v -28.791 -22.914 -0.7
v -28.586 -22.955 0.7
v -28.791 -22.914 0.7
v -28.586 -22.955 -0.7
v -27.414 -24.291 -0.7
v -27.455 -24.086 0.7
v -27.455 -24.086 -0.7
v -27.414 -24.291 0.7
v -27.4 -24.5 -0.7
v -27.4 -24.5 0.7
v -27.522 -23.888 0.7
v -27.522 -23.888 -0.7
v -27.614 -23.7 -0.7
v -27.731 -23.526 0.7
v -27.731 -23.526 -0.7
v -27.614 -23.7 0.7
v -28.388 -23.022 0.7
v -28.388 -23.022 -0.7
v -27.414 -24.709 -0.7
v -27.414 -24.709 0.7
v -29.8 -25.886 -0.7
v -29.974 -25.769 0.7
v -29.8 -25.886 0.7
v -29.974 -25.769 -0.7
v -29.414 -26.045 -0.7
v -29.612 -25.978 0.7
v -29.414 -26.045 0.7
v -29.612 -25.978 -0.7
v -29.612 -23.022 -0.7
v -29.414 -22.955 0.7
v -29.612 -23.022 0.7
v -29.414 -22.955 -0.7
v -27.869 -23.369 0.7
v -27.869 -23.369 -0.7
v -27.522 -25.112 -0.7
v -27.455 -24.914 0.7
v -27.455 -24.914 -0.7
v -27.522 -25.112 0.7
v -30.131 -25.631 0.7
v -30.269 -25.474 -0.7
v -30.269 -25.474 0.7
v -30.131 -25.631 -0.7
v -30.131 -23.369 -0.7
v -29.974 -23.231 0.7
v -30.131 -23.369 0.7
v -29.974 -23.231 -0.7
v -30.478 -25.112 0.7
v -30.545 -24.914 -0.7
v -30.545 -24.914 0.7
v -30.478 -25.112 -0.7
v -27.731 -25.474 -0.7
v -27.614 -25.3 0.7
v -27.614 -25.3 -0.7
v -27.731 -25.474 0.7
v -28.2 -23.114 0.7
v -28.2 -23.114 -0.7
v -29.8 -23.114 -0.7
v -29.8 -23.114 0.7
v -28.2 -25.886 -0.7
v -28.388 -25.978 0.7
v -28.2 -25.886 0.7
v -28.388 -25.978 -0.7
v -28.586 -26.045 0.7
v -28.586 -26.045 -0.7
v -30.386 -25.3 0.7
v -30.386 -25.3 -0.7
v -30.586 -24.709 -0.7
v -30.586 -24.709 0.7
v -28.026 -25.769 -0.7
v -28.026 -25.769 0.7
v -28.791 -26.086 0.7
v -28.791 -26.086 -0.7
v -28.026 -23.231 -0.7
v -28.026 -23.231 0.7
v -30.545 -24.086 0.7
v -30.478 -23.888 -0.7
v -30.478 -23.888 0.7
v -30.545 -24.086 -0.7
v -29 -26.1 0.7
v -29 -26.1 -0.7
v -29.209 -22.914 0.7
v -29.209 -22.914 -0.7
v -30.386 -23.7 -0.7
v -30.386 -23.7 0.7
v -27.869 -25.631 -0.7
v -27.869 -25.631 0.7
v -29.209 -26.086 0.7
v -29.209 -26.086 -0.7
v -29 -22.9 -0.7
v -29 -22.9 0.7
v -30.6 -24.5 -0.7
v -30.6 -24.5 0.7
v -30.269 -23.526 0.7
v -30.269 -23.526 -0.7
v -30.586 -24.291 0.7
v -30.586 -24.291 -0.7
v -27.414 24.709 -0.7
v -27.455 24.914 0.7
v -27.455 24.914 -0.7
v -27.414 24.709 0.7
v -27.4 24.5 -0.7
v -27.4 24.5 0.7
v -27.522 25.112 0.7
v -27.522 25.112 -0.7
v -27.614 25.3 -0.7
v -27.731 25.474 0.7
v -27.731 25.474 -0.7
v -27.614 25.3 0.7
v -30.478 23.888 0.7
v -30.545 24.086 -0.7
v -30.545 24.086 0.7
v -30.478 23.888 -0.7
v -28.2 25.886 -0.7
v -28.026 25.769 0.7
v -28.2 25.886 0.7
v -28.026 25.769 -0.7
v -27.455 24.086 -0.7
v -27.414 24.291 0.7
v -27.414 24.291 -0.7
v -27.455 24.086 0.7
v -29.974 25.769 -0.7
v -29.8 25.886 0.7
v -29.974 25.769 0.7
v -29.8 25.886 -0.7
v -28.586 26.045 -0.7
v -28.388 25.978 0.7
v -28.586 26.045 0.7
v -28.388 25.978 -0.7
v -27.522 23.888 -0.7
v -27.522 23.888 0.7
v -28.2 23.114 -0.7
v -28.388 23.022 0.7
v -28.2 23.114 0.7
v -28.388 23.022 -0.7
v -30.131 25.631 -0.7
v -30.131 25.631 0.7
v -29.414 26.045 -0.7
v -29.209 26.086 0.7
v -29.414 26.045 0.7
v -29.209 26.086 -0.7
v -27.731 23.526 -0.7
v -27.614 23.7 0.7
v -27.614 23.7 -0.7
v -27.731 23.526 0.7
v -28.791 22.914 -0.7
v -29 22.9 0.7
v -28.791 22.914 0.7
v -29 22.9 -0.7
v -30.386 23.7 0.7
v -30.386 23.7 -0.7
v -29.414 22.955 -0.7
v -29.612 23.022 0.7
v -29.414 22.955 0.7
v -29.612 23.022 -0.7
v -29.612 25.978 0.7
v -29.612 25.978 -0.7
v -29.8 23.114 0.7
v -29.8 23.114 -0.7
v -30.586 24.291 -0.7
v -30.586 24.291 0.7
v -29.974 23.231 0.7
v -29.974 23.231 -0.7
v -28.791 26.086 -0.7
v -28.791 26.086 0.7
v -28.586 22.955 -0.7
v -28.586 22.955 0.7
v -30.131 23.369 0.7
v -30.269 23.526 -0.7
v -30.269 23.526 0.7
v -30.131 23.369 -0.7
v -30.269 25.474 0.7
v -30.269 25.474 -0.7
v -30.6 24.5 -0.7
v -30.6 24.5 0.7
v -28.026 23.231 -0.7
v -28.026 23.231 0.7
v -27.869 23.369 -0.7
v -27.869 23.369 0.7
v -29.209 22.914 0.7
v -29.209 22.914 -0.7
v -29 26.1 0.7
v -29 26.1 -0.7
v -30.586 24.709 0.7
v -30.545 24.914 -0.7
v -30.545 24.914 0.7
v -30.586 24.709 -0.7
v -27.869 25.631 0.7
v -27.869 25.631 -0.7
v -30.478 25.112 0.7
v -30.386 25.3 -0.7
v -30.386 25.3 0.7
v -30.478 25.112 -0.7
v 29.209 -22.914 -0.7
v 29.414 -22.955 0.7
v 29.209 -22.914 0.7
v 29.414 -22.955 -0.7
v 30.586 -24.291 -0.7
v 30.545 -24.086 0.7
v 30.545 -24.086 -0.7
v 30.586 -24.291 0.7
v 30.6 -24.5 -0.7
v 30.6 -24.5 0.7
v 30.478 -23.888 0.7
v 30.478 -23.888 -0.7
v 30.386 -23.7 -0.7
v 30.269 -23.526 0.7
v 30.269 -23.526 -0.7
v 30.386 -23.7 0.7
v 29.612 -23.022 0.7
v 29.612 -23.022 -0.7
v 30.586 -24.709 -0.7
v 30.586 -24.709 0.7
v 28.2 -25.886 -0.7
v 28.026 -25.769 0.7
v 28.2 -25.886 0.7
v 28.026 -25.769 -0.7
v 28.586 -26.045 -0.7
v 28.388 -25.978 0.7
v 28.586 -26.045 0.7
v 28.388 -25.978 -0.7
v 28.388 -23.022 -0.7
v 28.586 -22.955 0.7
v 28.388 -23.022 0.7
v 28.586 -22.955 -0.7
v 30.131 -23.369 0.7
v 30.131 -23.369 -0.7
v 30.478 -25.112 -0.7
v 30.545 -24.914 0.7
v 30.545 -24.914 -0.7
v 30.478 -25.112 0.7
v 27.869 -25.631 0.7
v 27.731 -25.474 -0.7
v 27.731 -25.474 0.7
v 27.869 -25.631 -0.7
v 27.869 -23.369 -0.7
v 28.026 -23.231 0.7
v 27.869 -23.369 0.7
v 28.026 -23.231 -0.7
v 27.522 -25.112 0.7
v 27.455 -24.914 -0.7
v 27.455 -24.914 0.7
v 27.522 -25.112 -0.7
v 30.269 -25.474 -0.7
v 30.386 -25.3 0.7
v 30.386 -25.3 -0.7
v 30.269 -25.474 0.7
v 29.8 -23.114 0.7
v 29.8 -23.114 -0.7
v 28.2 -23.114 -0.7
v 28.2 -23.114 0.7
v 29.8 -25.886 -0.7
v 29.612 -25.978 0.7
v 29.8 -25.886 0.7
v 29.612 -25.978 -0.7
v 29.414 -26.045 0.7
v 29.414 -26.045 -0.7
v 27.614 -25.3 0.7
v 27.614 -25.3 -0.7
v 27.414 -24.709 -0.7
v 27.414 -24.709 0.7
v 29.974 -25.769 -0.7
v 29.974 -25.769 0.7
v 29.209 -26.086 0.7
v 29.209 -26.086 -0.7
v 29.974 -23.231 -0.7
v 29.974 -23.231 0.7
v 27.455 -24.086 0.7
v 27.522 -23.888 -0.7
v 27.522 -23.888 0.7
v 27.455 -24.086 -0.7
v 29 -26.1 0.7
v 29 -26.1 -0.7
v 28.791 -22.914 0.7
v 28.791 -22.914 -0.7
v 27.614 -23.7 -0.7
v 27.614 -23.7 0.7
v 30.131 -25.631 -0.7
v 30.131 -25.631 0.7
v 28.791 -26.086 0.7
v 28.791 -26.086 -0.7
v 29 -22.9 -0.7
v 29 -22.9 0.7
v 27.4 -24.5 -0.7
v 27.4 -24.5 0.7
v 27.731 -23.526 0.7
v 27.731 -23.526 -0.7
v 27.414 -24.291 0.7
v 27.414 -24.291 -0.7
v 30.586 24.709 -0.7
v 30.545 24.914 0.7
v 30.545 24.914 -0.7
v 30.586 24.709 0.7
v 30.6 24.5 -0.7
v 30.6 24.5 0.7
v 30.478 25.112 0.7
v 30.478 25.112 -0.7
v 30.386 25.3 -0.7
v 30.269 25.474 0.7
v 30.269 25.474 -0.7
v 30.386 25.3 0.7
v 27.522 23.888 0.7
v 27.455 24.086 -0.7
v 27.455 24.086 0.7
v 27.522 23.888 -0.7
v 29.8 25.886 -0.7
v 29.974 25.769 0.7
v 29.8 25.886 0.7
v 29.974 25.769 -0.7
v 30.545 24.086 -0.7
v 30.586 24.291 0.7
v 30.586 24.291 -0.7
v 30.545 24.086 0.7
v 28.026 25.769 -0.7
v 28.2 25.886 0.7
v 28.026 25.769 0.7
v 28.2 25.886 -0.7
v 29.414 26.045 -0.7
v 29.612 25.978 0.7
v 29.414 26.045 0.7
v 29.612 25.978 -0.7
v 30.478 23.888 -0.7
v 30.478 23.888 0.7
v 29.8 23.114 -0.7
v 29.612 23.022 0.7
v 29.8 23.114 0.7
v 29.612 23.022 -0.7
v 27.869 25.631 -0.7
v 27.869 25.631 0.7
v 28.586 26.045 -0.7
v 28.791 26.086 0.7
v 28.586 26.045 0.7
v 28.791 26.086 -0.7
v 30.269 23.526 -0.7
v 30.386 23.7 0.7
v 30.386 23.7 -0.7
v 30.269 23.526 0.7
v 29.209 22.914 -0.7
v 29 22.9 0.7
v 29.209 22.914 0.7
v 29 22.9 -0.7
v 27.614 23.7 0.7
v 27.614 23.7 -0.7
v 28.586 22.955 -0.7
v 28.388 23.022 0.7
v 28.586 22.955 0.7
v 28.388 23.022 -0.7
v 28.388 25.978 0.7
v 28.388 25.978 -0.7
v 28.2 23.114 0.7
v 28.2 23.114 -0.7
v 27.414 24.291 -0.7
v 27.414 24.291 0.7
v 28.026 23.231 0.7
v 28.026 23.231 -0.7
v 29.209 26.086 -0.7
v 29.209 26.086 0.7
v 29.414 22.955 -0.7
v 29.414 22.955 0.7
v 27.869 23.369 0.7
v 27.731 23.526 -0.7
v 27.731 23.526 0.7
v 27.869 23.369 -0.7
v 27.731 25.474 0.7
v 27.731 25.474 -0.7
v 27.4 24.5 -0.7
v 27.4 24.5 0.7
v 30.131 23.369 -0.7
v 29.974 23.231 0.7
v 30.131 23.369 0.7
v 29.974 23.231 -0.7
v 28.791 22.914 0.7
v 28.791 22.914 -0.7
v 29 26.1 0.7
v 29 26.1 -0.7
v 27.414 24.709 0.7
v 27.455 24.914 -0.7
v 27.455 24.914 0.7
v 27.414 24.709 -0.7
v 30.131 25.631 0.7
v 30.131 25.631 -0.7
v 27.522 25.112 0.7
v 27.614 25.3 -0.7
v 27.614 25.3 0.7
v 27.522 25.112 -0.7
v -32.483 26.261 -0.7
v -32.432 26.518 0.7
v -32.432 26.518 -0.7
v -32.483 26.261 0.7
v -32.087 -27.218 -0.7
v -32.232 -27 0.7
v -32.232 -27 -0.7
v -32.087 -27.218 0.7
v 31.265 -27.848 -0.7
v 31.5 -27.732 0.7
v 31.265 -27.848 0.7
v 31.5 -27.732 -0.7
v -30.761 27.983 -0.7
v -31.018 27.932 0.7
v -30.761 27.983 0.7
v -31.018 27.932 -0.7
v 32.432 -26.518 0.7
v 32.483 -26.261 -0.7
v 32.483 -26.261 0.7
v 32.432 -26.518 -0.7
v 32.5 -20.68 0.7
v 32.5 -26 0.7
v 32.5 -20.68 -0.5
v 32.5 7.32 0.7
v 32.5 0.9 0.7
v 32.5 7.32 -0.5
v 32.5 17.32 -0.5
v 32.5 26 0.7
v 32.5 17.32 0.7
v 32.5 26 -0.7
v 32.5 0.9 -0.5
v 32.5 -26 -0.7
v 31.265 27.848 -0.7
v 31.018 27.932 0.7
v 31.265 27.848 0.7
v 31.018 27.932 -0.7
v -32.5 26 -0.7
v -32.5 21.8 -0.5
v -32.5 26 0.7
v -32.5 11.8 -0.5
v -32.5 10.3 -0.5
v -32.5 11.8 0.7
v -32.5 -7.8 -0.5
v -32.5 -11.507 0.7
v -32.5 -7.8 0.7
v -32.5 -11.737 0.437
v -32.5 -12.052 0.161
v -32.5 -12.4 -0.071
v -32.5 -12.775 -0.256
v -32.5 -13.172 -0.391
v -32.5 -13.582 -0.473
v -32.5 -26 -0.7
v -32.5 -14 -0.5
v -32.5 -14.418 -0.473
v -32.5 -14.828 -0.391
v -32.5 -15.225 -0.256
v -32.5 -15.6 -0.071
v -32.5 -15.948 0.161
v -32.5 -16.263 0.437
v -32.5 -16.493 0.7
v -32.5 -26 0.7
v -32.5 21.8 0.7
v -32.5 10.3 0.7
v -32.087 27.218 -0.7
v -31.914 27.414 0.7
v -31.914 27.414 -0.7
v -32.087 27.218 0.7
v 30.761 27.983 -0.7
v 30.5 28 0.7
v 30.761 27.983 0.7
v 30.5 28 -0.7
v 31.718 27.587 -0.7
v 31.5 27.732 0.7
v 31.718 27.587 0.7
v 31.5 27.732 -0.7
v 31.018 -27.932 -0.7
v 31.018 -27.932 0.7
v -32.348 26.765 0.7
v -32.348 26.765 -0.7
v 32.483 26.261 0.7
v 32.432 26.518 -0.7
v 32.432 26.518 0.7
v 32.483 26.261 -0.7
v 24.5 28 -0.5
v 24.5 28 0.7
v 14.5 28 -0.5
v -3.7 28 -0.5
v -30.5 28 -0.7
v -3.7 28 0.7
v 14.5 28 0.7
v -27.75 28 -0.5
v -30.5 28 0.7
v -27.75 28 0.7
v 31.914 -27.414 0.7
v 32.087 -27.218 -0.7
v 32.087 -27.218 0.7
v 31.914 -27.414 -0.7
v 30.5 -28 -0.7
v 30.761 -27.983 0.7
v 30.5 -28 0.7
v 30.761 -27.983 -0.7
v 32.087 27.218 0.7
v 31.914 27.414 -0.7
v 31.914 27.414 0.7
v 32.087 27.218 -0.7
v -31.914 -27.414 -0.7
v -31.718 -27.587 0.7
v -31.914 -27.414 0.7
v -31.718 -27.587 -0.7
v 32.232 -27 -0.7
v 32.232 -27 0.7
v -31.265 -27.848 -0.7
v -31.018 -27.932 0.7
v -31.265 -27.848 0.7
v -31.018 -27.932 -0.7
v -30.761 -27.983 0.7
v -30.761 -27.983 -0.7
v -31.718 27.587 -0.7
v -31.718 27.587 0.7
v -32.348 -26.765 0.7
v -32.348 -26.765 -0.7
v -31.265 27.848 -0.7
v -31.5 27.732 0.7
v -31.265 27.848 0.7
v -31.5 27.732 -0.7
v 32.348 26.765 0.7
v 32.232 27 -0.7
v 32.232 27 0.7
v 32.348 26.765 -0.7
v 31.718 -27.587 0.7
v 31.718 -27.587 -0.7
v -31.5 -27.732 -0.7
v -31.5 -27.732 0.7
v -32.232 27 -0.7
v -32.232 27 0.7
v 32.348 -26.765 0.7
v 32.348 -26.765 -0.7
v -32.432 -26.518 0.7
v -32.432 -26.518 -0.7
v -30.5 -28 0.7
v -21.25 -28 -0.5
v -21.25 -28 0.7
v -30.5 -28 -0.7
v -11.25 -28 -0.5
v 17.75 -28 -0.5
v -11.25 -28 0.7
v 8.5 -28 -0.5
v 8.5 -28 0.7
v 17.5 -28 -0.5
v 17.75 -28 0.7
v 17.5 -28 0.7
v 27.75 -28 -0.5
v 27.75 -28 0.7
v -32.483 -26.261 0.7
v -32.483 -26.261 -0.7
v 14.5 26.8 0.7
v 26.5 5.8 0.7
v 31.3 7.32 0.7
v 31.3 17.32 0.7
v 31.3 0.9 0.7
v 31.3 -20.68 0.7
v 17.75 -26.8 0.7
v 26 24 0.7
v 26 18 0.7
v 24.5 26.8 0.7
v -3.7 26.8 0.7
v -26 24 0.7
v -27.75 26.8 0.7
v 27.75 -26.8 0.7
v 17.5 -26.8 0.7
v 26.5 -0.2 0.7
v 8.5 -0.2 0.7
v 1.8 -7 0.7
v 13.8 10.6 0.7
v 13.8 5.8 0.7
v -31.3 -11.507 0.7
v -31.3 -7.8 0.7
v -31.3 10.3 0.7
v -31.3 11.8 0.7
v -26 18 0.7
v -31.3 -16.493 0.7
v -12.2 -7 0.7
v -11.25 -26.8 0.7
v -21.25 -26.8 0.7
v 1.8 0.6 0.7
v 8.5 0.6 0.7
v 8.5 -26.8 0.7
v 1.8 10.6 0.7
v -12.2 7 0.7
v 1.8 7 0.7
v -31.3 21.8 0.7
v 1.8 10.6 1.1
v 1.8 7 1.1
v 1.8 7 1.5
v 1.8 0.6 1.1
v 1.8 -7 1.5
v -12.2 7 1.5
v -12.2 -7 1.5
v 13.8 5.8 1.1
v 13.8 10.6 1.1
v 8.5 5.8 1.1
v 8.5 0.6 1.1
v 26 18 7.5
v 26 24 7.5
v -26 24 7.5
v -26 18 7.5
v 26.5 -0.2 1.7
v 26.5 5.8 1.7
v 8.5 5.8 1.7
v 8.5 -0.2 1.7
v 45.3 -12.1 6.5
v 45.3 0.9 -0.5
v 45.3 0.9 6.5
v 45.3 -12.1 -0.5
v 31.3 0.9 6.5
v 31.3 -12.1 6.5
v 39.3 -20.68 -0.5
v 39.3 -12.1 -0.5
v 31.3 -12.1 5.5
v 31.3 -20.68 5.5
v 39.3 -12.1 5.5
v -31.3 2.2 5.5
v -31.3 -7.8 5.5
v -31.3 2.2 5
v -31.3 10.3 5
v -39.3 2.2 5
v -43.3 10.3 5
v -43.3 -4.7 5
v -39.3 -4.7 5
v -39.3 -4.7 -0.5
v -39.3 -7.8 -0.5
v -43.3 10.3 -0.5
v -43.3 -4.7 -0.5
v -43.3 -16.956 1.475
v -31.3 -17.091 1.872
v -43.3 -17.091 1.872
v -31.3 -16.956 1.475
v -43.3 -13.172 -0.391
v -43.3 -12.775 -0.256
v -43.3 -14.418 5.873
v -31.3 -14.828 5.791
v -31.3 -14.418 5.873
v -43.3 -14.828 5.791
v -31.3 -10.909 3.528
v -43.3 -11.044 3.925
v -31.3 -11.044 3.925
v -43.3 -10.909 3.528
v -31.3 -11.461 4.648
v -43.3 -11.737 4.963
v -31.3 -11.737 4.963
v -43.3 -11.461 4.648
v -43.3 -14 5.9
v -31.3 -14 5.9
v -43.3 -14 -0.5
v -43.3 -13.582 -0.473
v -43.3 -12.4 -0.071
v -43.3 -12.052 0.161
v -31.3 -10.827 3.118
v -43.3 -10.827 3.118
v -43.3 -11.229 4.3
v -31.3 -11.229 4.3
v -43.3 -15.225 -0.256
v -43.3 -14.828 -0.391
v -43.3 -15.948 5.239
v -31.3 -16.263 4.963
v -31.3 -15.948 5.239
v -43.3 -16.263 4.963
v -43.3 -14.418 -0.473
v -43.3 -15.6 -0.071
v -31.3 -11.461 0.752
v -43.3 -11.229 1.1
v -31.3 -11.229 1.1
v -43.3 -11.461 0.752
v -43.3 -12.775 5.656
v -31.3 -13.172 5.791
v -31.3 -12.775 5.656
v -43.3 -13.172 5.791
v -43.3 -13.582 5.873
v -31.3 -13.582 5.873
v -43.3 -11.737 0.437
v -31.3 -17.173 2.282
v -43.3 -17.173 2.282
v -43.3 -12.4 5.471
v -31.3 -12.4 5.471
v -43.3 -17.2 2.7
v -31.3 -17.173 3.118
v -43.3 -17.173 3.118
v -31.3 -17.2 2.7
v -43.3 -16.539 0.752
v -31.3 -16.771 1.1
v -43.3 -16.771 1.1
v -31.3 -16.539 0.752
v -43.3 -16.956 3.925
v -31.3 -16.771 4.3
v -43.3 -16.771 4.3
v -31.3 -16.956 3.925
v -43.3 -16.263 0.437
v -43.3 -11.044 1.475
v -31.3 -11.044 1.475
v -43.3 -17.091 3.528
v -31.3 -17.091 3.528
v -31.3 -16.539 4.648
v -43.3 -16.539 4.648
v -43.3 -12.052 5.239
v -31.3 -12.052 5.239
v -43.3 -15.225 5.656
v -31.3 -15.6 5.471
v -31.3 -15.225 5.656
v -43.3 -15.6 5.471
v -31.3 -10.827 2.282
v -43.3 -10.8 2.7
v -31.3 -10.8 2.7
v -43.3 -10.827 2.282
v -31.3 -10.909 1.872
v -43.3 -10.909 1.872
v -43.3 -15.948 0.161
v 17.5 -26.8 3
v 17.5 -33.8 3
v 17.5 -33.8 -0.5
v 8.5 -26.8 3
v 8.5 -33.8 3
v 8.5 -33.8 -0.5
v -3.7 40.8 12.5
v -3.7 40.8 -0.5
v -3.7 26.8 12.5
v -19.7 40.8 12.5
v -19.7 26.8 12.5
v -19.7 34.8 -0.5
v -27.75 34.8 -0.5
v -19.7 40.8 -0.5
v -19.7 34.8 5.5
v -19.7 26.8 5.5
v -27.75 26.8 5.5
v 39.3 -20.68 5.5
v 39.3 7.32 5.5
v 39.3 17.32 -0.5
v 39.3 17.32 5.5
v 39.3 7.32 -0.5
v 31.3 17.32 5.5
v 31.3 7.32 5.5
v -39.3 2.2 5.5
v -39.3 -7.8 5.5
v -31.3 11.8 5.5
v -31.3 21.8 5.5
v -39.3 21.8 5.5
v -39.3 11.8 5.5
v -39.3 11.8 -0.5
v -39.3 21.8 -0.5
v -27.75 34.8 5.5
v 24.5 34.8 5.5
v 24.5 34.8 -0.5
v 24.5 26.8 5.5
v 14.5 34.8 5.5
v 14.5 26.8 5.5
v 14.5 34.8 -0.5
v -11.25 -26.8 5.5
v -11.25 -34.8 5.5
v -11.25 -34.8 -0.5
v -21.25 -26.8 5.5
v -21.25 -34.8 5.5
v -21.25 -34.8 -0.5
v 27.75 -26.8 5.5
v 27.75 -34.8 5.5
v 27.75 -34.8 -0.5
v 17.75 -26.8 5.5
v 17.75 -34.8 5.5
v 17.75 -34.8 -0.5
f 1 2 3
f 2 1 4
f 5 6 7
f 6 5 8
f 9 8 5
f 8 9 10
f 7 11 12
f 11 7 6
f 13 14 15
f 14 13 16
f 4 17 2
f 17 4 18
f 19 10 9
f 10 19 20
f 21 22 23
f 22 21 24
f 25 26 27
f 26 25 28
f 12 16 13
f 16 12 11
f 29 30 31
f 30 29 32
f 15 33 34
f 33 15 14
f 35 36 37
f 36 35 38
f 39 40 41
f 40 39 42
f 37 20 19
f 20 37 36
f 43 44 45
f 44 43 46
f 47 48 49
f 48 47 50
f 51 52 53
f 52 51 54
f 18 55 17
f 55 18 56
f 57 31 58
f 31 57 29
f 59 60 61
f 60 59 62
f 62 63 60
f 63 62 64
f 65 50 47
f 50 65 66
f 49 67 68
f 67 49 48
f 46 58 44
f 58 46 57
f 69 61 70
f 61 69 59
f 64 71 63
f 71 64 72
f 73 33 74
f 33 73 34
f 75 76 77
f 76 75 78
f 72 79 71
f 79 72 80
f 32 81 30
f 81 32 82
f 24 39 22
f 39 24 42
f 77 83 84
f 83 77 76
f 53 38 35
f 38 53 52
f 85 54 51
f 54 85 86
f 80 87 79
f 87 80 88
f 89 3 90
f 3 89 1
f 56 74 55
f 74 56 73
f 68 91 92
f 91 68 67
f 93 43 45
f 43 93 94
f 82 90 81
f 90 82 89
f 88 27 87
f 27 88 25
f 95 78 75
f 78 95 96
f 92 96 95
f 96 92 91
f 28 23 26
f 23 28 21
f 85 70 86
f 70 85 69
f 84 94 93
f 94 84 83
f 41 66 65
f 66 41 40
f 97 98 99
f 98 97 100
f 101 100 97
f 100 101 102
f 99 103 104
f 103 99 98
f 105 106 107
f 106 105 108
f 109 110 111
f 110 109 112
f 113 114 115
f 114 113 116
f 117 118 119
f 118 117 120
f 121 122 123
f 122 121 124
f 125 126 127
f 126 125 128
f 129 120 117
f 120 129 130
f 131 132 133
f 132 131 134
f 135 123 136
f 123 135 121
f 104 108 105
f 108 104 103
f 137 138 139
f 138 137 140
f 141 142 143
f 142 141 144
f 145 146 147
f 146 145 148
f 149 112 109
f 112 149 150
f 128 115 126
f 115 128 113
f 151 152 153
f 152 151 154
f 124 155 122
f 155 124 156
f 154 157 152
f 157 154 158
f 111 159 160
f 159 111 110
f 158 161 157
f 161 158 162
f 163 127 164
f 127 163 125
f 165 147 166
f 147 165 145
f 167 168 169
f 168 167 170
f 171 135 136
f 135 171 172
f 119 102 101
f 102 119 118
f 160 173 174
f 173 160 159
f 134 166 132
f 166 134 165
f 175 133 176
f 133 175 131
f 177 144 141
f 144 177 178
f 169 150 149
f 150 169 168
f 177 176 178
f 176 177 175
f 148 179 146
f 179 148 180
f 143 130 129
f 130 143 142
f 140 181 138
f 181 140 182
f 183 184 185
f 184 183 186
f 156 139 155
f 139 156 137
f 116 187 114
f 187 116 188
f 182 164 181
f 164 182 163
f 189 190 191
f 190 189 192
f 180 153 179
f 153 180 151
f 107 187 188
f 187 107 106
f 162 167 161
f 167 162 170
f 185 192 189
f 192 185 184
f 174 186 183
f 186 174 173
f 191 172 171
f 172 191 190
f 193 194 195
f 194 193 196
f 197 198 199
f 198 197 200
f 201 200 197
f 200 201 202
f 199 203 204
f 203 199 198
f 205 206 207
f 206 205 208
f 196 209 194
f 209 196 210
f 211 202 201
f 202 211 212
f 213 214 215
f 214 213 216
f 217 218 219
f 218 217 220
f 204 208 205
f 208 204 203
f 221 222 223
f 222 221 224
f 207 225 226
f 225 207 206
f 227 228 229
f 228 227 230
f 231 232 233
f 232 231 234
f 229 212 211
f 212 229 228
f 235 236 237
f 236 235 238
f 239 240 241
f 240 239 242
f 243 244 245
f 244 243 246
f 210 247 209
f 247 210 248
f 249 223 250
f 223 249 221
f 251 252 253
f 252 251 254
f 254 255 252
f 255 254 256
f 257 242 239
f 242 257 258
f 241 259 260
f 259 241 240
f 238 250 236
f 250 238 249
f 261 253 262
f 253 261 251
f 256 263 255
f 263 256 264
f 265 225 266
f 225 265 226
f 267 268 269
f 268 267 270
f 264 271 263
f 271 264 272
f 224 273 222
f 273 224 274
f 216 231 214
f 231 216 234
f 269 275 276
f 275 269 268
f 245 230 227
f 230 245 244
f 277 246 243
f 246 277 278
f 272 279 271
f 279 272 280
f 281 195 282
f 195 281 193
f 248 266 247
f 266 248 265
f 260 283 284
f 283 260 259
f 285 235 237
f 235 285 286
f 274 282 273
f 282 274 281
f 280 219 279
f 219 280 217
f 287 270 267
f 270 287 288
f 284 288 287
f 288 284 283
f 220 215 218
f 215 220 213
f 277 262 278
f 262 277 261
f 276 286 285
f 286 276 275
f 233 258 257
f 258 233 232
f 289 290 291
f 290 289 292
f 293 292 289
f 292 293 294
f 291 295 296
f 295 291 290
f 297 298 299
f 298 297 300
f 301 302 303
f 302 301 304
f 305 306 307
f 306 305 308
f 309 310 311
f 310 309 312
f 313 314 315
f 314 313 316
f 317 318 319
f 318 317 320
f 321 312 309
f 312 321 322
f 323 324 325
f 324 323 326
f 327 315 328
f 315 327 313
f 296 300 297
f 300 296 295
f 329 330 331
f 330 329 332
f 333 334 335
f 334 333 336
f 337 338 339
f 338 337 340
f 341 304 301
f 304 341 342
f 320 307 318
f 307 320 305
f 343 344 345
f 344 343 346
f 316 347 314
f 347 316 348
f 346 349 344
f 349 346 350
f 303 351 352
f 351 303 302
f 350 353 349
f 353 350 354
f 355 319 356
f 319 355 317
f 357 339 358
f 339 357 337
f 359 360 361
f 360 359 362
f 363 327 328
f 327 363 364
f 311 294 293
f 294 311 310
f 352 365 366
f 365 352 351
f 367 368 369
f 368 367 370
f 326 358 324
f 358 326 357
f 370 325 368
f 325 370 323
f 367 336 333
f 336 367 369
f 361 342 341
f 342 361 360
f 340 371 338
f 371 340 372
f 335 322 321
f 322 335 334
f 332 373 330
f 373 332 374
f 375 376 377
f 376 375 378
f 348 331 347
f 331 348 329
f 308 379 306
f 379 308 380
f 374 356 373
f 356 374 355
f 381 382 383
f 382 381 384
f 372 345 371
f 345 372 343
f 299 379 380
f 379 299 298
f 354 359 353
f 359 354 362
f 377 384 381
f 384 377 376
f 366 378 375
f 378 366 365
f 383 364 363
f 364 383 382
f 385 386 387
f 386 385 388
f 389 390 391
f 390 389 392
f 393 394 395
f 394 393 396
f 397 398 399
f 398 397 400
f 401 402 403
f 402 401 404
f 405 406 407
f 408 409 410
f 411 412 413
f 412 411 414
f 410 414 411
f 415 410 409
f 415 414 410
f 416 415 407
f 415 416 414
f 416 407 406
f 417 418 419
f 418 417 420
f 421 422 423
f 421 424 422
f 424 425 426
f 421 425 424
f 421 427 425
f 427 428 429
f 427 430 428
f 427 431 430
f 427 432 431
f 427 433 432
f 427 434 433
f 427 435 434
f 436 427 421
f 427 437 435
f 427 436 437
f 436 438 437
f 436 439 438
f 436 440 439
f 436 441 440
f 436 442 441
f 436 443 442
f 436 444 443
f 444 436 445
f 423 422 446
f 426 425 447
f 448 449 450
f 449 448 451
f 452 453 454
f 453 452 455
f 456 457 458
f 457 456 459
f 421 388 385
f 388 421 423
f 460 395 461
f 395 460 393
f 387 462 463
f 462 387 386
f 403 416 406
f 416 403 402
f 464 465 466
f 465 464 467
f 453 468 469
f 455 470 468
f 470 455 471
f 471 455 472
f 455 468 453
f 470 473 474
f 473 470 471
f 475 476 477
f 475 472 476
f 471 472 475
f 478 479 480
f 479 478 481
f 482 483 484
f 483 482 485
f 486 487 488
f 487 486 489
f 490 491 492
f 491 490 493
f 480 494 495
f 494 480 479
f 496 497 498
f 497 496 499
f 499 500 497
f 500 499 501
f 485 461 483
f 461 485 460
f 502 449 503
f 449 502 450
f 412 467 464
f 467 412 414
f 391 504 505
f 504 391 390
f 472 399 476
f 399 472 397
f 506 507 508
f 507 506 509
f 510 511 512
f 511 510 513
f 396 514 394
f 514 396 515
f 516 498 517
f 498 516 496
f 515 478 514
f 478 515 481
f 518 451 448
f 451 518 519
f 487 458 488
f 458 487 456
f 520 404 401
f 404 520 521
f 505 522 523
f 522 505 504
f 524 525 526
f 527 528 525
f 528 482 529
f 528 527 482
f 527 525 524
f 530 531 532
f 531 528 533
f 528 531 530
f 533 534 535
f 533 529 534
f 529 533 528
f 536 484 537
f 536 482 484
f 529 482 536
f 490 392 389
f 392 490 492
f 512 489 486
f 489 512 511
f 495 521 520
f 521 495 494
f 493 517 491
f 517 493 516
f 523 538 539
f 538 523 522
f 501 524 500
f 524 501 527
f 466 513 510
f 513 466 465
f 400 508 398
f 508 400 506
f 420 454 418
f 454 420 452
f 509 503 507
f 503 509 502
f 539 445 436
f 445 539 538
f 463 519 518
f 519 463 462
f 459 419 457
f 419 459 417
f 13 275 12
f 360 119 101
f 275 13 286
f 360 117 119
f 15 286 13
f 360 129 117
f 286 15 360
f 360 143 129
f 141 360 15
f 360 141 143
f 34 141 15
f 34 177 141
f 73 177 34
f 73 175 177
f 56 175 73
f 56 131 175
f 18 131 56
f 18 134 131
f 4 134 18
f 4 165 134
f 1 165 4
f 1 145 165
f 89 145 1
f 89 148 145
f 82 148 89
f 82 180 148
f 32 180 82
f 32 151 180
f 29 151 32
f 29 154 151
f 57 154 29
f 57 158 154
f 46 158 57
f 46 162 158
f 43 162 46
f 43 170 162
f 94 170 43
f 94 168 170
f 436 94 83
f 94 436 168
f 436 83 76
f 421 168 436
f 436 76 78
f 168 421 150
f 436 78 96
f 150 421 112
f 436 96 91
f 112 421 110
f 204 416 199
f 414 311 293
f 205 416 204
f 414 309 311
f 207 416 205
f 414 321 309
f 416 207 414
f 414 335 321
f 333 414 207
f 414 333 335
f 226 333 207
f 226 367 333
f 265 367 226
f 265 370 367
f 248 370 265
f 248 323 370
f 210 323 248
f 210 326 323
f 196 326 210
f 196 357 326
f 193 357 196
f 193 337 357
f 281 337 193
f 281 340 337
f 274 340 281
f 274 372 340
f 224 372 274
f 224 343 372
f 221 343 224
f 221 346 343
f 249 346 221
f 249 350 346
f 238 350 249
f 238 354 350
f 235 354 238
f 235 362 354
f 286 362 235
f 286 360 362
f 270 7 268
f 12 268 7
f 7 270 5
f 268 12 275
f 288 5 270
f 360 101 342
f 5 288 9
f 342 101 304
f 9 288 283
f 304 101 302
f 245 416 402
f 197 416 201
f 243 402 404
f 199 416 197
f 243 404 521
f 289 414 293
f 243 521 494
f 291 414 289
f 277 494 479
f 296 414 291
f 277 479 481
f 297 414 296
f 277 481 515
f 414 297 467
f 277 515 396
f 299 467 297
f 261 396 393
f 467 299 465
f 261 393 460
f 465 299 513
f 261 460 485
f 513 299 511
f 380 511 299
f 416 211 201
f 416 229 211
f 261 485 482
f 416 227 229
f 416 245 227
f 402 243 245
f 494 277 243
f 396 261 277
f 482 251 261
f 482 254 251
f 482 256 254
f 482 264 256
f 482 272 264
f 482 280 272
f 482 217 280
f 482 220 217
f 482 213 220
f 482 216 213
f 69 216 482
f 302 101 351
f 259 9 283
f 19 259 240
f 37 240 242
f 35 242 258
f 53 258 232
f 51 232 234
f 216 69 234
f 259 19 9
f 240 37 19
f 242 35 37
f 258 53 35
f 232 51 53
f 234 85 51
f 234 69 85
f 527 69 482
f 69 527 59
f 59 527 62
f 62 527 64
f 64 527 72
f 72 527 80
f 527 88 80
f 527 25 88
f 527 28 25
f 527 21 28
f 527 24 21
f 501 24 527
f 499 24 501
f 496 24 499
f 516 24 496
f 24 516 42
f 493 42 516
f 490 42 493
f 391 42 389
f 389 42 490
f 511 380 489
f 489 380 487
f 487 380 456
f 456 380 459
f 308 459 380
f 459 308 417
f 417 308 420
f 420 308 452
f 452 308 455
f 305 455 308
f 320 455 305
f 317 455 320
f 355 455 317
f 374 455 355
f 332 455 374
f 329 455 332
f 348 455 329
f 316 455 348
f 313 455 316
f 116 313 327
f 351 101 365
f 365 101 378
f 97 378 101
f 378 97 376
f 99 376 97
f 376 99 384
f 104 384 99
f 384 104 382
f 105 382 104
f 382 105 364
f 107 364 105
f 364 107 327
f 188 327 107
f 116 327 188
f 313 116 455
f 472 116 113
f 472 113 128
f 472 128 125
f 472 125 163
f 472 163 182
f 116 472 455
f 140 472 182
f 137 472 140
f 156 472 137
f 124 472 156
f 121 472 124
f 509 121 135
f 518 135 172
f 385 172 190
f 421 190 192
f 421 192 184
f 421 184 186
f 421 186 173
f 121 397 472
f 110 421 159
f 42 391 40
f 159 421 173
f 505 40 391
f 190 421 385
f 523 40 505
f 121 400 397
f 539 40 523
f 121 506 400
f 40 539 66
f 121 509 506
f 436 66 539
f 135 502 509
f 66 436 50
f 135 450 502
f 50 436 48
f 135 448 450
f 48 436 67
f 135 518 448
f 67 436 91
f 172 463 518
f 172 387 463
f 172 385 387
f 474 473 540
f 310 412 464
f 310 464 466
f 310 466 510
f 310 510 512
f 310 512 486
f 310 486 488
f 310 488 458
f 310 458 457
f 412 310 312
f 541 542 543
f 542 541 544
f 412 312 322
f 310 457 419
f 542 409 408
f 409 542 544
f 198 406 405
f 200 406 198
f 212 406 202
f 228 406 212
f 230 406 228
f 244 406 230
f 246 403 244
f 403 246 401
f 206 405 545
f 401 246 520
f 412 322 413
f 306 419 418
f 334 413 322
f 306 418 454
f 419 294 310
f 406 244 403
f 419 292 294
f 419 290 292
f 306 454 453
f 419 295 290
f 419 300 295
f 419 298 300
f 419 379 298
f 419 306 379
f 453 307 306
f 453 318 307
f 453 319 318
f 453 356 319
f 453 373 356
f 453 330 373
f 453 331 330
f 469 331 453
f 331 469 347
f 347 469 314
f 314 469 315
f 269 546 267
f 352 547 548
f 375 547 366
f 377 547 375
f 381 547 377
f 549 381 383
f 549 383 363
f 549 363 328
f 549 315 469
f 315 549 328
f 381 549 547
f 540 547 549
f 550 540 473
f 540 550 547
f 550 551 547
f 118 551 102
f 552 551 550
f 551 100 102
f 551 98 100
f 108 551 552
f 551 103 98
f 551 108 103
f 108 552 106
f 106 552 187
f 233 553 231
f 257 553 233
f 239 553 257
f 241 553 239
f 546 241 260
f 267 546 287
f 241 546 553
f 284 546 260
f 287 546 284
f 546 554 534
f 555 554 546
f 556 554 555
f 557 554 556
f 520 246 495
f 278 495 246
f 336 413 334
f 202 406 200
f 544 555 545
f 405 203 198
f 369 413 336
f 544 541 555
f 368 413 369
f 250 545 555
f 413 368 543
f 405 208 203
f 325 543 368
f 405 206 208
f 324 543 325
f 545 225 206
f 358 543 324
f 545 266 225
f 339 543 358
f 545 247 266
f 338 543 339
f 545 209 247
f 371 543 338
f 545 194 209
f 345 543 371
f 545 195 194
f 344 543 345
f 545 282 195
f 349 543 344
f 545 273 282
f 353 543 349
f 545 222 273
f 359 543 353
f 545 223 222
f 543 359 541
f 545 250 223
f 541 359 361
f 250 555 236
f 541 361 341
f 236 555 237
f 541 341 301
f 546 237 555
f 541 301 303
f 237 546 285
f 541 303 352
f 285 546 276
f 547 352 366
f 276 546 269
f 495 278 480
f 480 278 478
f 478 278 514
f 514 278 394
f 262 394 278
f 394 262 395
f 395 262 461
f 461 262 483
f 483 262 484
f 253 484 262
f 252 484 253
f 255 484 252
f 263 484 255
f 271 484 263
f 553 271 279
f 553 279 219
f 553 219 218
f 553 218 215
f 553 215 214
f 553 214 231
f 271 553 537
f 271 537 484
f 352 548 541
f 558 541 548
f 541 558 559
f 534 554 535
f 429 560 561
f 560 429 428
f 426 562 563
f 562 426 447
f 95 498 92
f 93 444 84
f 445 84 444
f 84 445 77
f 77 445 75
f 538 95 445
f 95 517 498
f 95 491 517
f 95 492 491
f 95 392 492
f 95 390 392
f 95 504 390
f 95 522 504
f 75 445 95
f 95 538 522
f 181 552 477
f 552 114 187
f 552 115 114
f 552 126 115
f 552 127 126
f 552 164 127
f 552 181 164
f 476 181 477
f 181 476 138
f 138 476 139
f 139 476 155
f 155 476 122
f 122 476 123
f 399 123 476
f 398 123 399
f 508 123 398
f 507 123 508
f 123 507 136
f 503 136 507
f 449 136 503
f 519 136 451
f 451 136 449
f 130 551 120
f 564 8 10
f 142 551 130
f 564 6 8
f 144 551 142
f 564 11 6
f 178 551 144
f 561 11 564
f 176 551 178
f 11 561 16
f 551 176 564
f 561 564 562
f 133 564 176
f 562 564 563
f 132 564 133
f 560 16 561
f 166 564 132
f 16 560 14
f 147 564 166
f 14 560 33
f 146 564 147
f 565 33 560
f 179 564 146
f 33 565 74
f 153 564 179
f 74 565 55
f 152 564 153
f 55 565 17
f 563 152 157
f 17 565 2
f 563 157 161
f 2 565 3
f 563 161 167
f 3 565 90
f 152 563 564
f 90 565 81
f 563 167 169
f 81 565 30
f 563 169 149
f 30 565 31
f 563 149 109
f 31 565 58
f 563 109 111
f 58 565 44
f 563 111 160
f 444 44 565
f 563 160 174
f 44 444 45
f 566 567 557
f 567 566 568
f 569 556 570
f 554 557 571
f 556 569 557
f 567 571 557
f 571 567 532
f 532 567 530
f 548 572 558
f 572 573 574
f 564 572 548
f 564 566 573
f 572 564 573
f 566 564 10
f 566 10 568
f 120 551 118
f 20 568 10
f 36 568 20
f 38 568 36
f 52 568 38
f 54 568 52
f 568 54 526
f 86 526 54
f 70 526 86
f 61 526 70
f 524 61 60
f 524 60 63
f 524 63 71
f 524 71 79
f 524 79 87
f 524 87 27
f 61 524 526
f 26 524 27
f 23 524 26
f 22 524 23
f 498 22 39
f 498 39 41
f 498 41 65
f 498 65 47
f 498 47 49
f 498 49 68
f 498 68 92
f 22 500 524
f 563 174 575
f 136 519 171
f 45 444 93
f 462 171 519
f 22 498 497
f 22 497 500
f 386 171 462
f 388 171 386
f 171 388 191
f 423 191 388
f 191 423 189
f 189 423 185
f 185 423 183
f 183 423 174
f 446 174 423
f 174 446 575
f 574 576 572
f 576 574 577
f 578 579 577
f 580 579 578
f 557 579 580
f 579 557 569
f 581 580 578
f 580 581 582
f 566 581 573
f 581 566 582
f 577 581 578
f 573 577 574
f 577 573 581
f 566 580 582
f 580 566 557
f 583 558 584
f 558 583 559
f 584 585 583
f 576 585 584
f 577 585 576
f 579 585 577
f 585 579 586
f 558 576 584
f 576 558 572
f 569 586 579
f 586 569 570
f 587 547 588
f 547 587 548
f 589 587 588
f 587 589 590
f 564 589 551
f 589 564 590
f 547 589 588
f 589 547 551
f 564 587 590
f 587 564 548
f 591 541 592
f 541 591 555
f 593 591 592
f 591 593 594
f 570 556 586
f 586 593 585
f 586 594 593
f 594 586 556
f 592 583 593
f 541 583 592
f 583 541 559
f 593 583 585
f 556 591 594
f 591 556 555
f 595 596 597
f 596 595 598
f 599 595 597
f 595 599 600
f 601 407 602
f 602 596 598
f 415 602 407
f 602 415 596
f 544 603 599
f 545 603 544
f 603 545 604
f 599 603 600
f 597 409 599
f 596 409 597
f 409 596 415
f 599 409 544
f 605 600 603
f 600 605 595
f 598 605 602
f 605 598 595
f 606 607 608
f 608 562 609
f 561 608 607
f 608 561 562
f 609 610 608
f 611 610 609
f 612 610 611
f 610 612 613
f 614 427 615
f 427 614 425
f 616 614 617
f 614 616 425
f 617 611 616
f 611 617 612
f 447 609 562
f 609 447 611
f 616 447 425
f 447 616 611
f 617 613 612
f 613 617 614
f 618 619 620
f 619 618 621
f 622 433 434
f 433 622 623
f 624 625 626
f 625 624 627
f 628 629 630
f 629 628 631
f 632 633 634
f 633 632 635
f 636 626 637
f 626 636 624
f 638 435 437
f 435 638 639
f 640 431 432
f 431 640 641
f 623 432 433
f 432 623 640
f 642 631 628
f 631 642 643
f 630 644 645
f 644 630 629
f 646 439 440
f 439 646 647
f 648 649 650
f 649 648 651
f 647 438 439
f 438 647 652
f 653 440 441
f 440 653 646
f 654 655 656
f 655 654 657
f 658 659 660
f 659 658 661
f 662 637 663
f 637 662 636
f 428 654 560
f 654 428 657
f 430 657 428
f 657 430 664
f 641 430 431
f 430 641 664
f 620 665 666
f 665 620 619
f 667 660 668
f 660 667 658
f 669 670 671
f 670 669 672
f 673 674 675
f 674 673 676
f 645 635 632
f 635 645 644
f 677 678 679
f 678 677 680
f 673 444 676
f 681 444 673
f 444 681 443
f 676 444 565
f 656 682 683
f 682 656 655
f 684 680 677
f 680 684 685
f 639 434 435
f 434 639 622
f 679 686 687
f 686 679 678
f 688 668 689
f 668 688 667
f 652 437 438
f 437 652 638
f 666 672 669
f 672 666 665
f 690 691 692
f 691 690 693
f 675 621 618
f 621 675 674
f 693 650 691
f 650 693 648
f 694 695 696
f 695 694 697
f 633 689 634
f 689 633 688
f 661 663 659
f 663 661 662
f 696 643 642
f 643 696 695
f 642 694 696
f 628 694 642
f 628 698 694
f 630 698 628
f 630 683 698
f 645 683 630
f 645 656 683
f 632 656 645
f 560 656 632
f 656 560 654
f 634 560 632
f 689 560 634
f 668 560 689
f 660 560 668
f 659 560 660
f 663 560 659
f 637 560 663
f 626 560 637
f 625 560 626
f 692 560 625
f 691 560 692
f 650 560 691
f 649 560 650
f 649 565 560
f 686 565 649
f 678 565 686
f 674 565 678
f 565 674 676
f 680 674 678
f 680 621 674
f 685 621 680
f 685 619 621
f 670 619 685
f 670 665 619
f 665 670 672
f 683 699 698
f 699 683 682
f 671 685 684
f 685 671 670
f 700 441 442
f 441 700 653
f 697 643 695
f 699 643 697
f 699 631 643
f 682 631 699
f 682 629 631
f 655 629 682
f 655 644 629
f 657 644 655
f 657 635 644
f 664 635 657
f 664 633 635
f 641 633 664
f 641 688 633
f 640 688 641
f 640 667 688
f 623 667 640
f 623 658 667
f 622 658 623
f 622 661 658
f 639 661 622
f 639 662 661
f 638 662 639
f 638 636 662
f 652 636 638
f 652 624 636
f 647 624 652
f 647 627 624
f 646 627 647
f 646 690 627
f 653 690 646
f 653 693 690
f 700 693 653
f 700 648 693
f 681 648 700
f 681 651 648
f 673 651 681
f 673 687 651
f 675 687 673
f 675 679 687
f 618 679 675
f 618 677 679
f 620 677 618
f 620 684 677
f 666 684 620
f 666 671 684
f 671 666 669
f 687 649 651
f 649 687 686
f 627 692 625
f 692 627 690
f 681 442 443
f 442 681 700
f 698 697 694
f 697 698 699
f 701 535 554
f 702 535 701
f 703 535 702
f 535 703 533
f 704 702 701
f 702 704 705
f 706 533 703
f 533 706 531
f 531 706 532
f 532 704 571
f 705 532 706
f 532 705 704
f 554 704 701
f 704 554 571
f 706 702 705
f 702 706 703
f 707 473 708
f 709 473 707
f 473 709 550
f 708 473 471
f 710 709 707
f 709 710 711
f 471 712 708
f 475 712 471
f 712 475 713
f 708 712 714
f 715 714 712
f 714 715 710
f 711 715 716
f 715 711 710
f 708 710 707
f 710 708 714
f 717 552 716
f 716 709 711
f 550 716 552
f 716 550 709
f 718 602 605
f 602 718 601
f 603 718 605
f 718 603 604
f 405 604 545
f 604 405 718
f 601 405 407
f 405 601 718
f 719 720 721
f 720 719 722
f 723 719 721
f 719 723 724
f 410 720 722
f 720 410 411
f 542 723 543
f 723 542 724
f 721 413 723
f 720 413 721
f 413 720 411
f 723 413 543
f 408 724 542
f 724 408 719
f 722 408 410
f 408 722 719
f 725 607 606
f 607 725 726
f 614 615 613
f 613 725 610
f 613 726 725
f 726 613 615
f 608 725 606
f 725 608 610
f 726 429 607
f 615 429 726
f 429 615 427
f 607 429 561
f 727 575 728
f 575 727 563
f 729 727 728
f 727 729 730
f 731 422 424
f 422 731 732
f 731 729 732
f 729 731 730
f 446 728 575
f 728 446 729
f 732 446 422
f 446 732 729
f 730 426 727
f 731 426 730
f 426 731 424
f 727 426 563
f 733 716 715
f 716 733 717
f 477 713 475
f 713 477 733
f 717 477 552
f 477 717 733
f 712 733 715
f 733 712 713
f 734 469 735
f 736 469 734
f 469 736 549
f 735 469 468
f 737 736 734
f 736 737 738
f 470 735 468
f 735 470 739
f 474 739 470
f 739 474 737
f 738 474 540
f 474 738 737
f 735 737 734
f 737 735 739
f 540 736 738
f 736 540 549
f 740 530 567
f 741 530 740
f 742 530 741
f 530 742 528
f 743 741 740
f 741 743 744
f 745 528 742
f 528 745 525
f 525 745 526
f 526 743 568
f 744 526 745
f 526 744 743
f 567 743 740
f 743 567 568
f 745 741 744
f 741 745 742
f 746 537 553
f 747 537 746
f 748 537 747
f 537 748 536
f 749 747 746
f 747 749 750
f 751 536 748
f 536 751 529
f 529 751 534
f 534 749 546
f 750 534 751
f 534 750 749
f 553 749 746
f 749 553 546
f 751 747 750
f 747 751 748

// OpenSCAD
// Single-board computer (generic) 65.0mm x 56.0mm x 1.4mm PCB with connected features
// Output is ONE connected solid (no floating parts).

$fn = 48;

// Parameters
length_mm    = 65.0;  //[32.5:130.0:0.5]
width_mm     = 56.0;  //[28.0:112.0:0.5]
thickness_mm = 1.4;   //[0.7:2.8:0.1]

// Overlap to guarantee physical connection (1–2mm as required)
overlap = 1.2;

// --- Helpers ---
module rounded_rect_prism(l, w, h, r, center=true) {
    translate(center ? [0,0,0] : [l/2, w/2, h/2])
    hull() {
        for (sx = [-1, 1], sy = [-1, 1])
            translate([sx*(l/2 - r), sy*(w/2 - r), 0])
                cylinder(r=r, h=h, center=true);
    }
}

module pcb_base() {
    color([0.0, 0.4, 0.2])
        rounded_rect_prism(length_mm, width_mm, thickness_mm, r=2.0, center=true);
}

module mounting_holes_cut() {
    hole_r = 1.6;
    edge_x = 3.5;
    edge_y = 3.5;

    for (sx = [-1, 1], sy = [-1, 1]) {
        translate([sx*(length_mm/2 - edge_x), sy*(width_mm/2 - edge_y), 0])
            cylinder(r=hole_r, h=thickness_mm + 2, center=true);
    }
}

module pcb_with_holes() {
    difference() {
        pcb_base();
        mounting_holes_cut();
    }
}

// Place a part so its bottom intrudes into PCB top by 'overlap'
function z_on_top(part_h) = (thickness_mm/2) + (part_h/2) - overlap;

// Place a side part so it intrudes into PCB edge by 'overlap'
function x_on_right(part_l) = (length_mm/2) + (part_l/2) - overlap;
function x_on_left(part_l)  = -(length_mm/2) - (part_l/2) + overlap;
function y_on_top(part_l)   = (width_mm/2) + (part_l/2) - overlap;
function y_on_bottom(part_l)= -(width_mm/2) - (part_l/2) + overlap;

module top_components() {
    // All components are placed to INTERSECT the PCB top surface by 'overlap'.
    // This fixes "adjacent but not merged" cases in side views.
    // (No design change; only connectivity.)

    // Main SoC
    soc_l = 14; soc_w = 14; soc_h = 2.0;
    translate([-length_mm*0.08, 0, z_on_top(soc_h)])
        color([0.15,0.15,0.15])
            cube([soc_l, soc_w, soc_h], center=true);

    // RAM / secondary chip
    ram_l = 12; ram_w = 10; ram_h = 1.6;
    translate([length_mm*0.12, width_mm*0.10, z_on_top(ram_h)])
        color([0.18,0.18,0.18])
            cube([ram_l, ram_w, ram_h], center=true);

    // Power management IC
    pm_l = 8; pm_w = 8; pm_h = 1.2;
    translate([length_mm*0.18, -width_mm*0.18, z_on_top(pm_h)])
        color([0.2,0.2,0.2])
            cube([pm_l, pm_w, pm_h], center=true);

    // GPIO header block (2x20 style, generic)
    hdr_l = 52; hdr_w = 6; hdr_h = 8;
    translate([0, width_mm/2 - (hdr_w/2 + 4), z_on_top(hdr_h)])
        color([0.05,0.05,0.05])
            cube([hdr_l, hdr_w, hdr_h], center=true);

    // Camera/Display connector (flat)
    ffc_l = 18; ffc_w = 6; ffc_h = 2.2;
    translate([length_mm/2 - (ffc_l/2 + 6), width_mm*0.05, z_on_top(ffc_h)])
        color([0.85,0.85,0.85])
            cube([ffc_l, ffc_w, ffc_h], center=true);

    // Small passives cluster
    for (i = [0:5]) {
        cap_l = 3.2; cap_w = 2.0; cap_h = 1.2;
        x = -length_mm/2 + 10 + i*4.0;
        y = -width_mm/2 + 10;
        translate([x, y, z_on_top(cap_h)])
            color([0.6,0.6,0.6])
                cube([cap_l, cap_w, cap_h], center=true);
    }
}

module side_connectors() {
    // Side connectors are attached to PCB edges with overlap in X/Y and also overlap into PCB in Z.
    // This fixes "black side protrusions (ports) floating/offset" issues.

    // USB-A like connector on right edge
    usb_l = 14;  // along X (outward)
    usb_w = 13;  // along Y
    usb_h = 7;   // along Z
    translate([x_on_right(usb_l), -width_mm*0.10, z_on_top(usb_h)])
        color([0.75,0.75,0.75])
            cube([usb_l, usb_w, usb_h], center=true);

    // HDMI-like connector on left edge
    hdmi_l = 12;
    hdmi_w = 15;
    hdmi_h = 5.5;
    translate([x_on_left(hdmi_l), width_mm*0.05, z_on_top(hdmi_h)])
        color([0.7,0.7,0.7])
            cube([hdmi_l, hdmi_w, hdmi_h], center=true);

    // Audio jack-like cylinder on left edge
    // Ensure it intersects the PCB edge (X) and the PCB top (Z) by 'overlap'.
    jack_r = 3.2;
    jack_l = 12; // cylinder length along X after rotate
    translate([x_on_left(jack_l), -width_mm*0.25, (thickness_mm/2) + jack_r - overlap])
        rotate([0,90,0])
            color([0.1,0.1,0.1])
                cylinder(r=jack_r, h=jack_l, center=true);

    // Micro-USB/USB-C like power connector on bottom edge
    pwr_w = 9;   // along X
    pwr_l = 7;   // along Y outward
    pwr_h = 3.5; // along Z
    translate([length_mm*0.20, y_on_bottom(pwr_l), z_on_top(pwr_h)])
        color([0.75,0.75,0.75])
            cube([pwr_w, pwr_l, pwr_h], center=true);

    // Ethernet-like connector on top edge (generic)
    eth_w = 16;  // along X
    eth_l = 14;  // along Y outward
    eth_h = 13;  // along Z
    translate([-length_mm*0.18, y_on_top(eth_l), z_on_top(eth_h)])
        color([0.75,0.75,0.75])
            cube([eth_w, eth_l, eth_h], center=true);
}

module edge_connector_blocks() {
    // "Multiple gray connector/component blocks around the PCB perimeter"
    // Ensure they INTERSECT the PCB edge (X/Y) and also overlap into PCB in Z.
    // This fixes floating/disconnected perimeter blocks.

    blk_h = 6;
    blk_w = 10;   // tangential along edge
    blk_l = 8;    // outward from edge

    // Right edge: 2 blocks
    for (y = [-width_mm*0.28, width_mm*0.22]) {
        translate([x_on_right(blk_l), y, z_on_top(blk_h)])
            color([0.65,0.65,0.65])
                cube([blk_l, blk_w, blk_h], center=true);
    }

    // Left edge: 2 blocks (avoid HDMI/jack area)
    for (y = [-width_mm*0.05, width_mm*0.30]) {
        translate([x_on_left(blk_l), y, z_on_top(blk_h)])
            color([0.65,0.65,0.65])
                cube([blk_l, blk_w, blk_h], center=true);
    }

    // Top edge: 2 blocks (avoid GPIO header/ethernet area)
    for (x = [-length_mm*0.35, length_mm*0.30]) {
        translate([x, y_on_top(blk_l), z_on_top(blk_h)])
            color([0.65,0.65,0.65])
                cube([blk_w, blk_l, blk_h], center=true);
    }

    // Bottom edge: 2 blocks (avoid power connector area)
    for (x = [-length_mm*0.25, length_mm*0.35]) {
        translate([x, y_on_bottom(blk_l), z_on_top(blk_h)])
            color([0.65,0.65,0.65])
                cube([blk_w, blk_l, blk_h], center=true);
    }
}

module assembly() {
    // Single connected solid: everything unioned and overlapping by 1–2mm.
    union() {
        pcb_with_holes();
        top_components();
        side_connectors();
        edge_connector_blocks();
    }
}

assembly();
